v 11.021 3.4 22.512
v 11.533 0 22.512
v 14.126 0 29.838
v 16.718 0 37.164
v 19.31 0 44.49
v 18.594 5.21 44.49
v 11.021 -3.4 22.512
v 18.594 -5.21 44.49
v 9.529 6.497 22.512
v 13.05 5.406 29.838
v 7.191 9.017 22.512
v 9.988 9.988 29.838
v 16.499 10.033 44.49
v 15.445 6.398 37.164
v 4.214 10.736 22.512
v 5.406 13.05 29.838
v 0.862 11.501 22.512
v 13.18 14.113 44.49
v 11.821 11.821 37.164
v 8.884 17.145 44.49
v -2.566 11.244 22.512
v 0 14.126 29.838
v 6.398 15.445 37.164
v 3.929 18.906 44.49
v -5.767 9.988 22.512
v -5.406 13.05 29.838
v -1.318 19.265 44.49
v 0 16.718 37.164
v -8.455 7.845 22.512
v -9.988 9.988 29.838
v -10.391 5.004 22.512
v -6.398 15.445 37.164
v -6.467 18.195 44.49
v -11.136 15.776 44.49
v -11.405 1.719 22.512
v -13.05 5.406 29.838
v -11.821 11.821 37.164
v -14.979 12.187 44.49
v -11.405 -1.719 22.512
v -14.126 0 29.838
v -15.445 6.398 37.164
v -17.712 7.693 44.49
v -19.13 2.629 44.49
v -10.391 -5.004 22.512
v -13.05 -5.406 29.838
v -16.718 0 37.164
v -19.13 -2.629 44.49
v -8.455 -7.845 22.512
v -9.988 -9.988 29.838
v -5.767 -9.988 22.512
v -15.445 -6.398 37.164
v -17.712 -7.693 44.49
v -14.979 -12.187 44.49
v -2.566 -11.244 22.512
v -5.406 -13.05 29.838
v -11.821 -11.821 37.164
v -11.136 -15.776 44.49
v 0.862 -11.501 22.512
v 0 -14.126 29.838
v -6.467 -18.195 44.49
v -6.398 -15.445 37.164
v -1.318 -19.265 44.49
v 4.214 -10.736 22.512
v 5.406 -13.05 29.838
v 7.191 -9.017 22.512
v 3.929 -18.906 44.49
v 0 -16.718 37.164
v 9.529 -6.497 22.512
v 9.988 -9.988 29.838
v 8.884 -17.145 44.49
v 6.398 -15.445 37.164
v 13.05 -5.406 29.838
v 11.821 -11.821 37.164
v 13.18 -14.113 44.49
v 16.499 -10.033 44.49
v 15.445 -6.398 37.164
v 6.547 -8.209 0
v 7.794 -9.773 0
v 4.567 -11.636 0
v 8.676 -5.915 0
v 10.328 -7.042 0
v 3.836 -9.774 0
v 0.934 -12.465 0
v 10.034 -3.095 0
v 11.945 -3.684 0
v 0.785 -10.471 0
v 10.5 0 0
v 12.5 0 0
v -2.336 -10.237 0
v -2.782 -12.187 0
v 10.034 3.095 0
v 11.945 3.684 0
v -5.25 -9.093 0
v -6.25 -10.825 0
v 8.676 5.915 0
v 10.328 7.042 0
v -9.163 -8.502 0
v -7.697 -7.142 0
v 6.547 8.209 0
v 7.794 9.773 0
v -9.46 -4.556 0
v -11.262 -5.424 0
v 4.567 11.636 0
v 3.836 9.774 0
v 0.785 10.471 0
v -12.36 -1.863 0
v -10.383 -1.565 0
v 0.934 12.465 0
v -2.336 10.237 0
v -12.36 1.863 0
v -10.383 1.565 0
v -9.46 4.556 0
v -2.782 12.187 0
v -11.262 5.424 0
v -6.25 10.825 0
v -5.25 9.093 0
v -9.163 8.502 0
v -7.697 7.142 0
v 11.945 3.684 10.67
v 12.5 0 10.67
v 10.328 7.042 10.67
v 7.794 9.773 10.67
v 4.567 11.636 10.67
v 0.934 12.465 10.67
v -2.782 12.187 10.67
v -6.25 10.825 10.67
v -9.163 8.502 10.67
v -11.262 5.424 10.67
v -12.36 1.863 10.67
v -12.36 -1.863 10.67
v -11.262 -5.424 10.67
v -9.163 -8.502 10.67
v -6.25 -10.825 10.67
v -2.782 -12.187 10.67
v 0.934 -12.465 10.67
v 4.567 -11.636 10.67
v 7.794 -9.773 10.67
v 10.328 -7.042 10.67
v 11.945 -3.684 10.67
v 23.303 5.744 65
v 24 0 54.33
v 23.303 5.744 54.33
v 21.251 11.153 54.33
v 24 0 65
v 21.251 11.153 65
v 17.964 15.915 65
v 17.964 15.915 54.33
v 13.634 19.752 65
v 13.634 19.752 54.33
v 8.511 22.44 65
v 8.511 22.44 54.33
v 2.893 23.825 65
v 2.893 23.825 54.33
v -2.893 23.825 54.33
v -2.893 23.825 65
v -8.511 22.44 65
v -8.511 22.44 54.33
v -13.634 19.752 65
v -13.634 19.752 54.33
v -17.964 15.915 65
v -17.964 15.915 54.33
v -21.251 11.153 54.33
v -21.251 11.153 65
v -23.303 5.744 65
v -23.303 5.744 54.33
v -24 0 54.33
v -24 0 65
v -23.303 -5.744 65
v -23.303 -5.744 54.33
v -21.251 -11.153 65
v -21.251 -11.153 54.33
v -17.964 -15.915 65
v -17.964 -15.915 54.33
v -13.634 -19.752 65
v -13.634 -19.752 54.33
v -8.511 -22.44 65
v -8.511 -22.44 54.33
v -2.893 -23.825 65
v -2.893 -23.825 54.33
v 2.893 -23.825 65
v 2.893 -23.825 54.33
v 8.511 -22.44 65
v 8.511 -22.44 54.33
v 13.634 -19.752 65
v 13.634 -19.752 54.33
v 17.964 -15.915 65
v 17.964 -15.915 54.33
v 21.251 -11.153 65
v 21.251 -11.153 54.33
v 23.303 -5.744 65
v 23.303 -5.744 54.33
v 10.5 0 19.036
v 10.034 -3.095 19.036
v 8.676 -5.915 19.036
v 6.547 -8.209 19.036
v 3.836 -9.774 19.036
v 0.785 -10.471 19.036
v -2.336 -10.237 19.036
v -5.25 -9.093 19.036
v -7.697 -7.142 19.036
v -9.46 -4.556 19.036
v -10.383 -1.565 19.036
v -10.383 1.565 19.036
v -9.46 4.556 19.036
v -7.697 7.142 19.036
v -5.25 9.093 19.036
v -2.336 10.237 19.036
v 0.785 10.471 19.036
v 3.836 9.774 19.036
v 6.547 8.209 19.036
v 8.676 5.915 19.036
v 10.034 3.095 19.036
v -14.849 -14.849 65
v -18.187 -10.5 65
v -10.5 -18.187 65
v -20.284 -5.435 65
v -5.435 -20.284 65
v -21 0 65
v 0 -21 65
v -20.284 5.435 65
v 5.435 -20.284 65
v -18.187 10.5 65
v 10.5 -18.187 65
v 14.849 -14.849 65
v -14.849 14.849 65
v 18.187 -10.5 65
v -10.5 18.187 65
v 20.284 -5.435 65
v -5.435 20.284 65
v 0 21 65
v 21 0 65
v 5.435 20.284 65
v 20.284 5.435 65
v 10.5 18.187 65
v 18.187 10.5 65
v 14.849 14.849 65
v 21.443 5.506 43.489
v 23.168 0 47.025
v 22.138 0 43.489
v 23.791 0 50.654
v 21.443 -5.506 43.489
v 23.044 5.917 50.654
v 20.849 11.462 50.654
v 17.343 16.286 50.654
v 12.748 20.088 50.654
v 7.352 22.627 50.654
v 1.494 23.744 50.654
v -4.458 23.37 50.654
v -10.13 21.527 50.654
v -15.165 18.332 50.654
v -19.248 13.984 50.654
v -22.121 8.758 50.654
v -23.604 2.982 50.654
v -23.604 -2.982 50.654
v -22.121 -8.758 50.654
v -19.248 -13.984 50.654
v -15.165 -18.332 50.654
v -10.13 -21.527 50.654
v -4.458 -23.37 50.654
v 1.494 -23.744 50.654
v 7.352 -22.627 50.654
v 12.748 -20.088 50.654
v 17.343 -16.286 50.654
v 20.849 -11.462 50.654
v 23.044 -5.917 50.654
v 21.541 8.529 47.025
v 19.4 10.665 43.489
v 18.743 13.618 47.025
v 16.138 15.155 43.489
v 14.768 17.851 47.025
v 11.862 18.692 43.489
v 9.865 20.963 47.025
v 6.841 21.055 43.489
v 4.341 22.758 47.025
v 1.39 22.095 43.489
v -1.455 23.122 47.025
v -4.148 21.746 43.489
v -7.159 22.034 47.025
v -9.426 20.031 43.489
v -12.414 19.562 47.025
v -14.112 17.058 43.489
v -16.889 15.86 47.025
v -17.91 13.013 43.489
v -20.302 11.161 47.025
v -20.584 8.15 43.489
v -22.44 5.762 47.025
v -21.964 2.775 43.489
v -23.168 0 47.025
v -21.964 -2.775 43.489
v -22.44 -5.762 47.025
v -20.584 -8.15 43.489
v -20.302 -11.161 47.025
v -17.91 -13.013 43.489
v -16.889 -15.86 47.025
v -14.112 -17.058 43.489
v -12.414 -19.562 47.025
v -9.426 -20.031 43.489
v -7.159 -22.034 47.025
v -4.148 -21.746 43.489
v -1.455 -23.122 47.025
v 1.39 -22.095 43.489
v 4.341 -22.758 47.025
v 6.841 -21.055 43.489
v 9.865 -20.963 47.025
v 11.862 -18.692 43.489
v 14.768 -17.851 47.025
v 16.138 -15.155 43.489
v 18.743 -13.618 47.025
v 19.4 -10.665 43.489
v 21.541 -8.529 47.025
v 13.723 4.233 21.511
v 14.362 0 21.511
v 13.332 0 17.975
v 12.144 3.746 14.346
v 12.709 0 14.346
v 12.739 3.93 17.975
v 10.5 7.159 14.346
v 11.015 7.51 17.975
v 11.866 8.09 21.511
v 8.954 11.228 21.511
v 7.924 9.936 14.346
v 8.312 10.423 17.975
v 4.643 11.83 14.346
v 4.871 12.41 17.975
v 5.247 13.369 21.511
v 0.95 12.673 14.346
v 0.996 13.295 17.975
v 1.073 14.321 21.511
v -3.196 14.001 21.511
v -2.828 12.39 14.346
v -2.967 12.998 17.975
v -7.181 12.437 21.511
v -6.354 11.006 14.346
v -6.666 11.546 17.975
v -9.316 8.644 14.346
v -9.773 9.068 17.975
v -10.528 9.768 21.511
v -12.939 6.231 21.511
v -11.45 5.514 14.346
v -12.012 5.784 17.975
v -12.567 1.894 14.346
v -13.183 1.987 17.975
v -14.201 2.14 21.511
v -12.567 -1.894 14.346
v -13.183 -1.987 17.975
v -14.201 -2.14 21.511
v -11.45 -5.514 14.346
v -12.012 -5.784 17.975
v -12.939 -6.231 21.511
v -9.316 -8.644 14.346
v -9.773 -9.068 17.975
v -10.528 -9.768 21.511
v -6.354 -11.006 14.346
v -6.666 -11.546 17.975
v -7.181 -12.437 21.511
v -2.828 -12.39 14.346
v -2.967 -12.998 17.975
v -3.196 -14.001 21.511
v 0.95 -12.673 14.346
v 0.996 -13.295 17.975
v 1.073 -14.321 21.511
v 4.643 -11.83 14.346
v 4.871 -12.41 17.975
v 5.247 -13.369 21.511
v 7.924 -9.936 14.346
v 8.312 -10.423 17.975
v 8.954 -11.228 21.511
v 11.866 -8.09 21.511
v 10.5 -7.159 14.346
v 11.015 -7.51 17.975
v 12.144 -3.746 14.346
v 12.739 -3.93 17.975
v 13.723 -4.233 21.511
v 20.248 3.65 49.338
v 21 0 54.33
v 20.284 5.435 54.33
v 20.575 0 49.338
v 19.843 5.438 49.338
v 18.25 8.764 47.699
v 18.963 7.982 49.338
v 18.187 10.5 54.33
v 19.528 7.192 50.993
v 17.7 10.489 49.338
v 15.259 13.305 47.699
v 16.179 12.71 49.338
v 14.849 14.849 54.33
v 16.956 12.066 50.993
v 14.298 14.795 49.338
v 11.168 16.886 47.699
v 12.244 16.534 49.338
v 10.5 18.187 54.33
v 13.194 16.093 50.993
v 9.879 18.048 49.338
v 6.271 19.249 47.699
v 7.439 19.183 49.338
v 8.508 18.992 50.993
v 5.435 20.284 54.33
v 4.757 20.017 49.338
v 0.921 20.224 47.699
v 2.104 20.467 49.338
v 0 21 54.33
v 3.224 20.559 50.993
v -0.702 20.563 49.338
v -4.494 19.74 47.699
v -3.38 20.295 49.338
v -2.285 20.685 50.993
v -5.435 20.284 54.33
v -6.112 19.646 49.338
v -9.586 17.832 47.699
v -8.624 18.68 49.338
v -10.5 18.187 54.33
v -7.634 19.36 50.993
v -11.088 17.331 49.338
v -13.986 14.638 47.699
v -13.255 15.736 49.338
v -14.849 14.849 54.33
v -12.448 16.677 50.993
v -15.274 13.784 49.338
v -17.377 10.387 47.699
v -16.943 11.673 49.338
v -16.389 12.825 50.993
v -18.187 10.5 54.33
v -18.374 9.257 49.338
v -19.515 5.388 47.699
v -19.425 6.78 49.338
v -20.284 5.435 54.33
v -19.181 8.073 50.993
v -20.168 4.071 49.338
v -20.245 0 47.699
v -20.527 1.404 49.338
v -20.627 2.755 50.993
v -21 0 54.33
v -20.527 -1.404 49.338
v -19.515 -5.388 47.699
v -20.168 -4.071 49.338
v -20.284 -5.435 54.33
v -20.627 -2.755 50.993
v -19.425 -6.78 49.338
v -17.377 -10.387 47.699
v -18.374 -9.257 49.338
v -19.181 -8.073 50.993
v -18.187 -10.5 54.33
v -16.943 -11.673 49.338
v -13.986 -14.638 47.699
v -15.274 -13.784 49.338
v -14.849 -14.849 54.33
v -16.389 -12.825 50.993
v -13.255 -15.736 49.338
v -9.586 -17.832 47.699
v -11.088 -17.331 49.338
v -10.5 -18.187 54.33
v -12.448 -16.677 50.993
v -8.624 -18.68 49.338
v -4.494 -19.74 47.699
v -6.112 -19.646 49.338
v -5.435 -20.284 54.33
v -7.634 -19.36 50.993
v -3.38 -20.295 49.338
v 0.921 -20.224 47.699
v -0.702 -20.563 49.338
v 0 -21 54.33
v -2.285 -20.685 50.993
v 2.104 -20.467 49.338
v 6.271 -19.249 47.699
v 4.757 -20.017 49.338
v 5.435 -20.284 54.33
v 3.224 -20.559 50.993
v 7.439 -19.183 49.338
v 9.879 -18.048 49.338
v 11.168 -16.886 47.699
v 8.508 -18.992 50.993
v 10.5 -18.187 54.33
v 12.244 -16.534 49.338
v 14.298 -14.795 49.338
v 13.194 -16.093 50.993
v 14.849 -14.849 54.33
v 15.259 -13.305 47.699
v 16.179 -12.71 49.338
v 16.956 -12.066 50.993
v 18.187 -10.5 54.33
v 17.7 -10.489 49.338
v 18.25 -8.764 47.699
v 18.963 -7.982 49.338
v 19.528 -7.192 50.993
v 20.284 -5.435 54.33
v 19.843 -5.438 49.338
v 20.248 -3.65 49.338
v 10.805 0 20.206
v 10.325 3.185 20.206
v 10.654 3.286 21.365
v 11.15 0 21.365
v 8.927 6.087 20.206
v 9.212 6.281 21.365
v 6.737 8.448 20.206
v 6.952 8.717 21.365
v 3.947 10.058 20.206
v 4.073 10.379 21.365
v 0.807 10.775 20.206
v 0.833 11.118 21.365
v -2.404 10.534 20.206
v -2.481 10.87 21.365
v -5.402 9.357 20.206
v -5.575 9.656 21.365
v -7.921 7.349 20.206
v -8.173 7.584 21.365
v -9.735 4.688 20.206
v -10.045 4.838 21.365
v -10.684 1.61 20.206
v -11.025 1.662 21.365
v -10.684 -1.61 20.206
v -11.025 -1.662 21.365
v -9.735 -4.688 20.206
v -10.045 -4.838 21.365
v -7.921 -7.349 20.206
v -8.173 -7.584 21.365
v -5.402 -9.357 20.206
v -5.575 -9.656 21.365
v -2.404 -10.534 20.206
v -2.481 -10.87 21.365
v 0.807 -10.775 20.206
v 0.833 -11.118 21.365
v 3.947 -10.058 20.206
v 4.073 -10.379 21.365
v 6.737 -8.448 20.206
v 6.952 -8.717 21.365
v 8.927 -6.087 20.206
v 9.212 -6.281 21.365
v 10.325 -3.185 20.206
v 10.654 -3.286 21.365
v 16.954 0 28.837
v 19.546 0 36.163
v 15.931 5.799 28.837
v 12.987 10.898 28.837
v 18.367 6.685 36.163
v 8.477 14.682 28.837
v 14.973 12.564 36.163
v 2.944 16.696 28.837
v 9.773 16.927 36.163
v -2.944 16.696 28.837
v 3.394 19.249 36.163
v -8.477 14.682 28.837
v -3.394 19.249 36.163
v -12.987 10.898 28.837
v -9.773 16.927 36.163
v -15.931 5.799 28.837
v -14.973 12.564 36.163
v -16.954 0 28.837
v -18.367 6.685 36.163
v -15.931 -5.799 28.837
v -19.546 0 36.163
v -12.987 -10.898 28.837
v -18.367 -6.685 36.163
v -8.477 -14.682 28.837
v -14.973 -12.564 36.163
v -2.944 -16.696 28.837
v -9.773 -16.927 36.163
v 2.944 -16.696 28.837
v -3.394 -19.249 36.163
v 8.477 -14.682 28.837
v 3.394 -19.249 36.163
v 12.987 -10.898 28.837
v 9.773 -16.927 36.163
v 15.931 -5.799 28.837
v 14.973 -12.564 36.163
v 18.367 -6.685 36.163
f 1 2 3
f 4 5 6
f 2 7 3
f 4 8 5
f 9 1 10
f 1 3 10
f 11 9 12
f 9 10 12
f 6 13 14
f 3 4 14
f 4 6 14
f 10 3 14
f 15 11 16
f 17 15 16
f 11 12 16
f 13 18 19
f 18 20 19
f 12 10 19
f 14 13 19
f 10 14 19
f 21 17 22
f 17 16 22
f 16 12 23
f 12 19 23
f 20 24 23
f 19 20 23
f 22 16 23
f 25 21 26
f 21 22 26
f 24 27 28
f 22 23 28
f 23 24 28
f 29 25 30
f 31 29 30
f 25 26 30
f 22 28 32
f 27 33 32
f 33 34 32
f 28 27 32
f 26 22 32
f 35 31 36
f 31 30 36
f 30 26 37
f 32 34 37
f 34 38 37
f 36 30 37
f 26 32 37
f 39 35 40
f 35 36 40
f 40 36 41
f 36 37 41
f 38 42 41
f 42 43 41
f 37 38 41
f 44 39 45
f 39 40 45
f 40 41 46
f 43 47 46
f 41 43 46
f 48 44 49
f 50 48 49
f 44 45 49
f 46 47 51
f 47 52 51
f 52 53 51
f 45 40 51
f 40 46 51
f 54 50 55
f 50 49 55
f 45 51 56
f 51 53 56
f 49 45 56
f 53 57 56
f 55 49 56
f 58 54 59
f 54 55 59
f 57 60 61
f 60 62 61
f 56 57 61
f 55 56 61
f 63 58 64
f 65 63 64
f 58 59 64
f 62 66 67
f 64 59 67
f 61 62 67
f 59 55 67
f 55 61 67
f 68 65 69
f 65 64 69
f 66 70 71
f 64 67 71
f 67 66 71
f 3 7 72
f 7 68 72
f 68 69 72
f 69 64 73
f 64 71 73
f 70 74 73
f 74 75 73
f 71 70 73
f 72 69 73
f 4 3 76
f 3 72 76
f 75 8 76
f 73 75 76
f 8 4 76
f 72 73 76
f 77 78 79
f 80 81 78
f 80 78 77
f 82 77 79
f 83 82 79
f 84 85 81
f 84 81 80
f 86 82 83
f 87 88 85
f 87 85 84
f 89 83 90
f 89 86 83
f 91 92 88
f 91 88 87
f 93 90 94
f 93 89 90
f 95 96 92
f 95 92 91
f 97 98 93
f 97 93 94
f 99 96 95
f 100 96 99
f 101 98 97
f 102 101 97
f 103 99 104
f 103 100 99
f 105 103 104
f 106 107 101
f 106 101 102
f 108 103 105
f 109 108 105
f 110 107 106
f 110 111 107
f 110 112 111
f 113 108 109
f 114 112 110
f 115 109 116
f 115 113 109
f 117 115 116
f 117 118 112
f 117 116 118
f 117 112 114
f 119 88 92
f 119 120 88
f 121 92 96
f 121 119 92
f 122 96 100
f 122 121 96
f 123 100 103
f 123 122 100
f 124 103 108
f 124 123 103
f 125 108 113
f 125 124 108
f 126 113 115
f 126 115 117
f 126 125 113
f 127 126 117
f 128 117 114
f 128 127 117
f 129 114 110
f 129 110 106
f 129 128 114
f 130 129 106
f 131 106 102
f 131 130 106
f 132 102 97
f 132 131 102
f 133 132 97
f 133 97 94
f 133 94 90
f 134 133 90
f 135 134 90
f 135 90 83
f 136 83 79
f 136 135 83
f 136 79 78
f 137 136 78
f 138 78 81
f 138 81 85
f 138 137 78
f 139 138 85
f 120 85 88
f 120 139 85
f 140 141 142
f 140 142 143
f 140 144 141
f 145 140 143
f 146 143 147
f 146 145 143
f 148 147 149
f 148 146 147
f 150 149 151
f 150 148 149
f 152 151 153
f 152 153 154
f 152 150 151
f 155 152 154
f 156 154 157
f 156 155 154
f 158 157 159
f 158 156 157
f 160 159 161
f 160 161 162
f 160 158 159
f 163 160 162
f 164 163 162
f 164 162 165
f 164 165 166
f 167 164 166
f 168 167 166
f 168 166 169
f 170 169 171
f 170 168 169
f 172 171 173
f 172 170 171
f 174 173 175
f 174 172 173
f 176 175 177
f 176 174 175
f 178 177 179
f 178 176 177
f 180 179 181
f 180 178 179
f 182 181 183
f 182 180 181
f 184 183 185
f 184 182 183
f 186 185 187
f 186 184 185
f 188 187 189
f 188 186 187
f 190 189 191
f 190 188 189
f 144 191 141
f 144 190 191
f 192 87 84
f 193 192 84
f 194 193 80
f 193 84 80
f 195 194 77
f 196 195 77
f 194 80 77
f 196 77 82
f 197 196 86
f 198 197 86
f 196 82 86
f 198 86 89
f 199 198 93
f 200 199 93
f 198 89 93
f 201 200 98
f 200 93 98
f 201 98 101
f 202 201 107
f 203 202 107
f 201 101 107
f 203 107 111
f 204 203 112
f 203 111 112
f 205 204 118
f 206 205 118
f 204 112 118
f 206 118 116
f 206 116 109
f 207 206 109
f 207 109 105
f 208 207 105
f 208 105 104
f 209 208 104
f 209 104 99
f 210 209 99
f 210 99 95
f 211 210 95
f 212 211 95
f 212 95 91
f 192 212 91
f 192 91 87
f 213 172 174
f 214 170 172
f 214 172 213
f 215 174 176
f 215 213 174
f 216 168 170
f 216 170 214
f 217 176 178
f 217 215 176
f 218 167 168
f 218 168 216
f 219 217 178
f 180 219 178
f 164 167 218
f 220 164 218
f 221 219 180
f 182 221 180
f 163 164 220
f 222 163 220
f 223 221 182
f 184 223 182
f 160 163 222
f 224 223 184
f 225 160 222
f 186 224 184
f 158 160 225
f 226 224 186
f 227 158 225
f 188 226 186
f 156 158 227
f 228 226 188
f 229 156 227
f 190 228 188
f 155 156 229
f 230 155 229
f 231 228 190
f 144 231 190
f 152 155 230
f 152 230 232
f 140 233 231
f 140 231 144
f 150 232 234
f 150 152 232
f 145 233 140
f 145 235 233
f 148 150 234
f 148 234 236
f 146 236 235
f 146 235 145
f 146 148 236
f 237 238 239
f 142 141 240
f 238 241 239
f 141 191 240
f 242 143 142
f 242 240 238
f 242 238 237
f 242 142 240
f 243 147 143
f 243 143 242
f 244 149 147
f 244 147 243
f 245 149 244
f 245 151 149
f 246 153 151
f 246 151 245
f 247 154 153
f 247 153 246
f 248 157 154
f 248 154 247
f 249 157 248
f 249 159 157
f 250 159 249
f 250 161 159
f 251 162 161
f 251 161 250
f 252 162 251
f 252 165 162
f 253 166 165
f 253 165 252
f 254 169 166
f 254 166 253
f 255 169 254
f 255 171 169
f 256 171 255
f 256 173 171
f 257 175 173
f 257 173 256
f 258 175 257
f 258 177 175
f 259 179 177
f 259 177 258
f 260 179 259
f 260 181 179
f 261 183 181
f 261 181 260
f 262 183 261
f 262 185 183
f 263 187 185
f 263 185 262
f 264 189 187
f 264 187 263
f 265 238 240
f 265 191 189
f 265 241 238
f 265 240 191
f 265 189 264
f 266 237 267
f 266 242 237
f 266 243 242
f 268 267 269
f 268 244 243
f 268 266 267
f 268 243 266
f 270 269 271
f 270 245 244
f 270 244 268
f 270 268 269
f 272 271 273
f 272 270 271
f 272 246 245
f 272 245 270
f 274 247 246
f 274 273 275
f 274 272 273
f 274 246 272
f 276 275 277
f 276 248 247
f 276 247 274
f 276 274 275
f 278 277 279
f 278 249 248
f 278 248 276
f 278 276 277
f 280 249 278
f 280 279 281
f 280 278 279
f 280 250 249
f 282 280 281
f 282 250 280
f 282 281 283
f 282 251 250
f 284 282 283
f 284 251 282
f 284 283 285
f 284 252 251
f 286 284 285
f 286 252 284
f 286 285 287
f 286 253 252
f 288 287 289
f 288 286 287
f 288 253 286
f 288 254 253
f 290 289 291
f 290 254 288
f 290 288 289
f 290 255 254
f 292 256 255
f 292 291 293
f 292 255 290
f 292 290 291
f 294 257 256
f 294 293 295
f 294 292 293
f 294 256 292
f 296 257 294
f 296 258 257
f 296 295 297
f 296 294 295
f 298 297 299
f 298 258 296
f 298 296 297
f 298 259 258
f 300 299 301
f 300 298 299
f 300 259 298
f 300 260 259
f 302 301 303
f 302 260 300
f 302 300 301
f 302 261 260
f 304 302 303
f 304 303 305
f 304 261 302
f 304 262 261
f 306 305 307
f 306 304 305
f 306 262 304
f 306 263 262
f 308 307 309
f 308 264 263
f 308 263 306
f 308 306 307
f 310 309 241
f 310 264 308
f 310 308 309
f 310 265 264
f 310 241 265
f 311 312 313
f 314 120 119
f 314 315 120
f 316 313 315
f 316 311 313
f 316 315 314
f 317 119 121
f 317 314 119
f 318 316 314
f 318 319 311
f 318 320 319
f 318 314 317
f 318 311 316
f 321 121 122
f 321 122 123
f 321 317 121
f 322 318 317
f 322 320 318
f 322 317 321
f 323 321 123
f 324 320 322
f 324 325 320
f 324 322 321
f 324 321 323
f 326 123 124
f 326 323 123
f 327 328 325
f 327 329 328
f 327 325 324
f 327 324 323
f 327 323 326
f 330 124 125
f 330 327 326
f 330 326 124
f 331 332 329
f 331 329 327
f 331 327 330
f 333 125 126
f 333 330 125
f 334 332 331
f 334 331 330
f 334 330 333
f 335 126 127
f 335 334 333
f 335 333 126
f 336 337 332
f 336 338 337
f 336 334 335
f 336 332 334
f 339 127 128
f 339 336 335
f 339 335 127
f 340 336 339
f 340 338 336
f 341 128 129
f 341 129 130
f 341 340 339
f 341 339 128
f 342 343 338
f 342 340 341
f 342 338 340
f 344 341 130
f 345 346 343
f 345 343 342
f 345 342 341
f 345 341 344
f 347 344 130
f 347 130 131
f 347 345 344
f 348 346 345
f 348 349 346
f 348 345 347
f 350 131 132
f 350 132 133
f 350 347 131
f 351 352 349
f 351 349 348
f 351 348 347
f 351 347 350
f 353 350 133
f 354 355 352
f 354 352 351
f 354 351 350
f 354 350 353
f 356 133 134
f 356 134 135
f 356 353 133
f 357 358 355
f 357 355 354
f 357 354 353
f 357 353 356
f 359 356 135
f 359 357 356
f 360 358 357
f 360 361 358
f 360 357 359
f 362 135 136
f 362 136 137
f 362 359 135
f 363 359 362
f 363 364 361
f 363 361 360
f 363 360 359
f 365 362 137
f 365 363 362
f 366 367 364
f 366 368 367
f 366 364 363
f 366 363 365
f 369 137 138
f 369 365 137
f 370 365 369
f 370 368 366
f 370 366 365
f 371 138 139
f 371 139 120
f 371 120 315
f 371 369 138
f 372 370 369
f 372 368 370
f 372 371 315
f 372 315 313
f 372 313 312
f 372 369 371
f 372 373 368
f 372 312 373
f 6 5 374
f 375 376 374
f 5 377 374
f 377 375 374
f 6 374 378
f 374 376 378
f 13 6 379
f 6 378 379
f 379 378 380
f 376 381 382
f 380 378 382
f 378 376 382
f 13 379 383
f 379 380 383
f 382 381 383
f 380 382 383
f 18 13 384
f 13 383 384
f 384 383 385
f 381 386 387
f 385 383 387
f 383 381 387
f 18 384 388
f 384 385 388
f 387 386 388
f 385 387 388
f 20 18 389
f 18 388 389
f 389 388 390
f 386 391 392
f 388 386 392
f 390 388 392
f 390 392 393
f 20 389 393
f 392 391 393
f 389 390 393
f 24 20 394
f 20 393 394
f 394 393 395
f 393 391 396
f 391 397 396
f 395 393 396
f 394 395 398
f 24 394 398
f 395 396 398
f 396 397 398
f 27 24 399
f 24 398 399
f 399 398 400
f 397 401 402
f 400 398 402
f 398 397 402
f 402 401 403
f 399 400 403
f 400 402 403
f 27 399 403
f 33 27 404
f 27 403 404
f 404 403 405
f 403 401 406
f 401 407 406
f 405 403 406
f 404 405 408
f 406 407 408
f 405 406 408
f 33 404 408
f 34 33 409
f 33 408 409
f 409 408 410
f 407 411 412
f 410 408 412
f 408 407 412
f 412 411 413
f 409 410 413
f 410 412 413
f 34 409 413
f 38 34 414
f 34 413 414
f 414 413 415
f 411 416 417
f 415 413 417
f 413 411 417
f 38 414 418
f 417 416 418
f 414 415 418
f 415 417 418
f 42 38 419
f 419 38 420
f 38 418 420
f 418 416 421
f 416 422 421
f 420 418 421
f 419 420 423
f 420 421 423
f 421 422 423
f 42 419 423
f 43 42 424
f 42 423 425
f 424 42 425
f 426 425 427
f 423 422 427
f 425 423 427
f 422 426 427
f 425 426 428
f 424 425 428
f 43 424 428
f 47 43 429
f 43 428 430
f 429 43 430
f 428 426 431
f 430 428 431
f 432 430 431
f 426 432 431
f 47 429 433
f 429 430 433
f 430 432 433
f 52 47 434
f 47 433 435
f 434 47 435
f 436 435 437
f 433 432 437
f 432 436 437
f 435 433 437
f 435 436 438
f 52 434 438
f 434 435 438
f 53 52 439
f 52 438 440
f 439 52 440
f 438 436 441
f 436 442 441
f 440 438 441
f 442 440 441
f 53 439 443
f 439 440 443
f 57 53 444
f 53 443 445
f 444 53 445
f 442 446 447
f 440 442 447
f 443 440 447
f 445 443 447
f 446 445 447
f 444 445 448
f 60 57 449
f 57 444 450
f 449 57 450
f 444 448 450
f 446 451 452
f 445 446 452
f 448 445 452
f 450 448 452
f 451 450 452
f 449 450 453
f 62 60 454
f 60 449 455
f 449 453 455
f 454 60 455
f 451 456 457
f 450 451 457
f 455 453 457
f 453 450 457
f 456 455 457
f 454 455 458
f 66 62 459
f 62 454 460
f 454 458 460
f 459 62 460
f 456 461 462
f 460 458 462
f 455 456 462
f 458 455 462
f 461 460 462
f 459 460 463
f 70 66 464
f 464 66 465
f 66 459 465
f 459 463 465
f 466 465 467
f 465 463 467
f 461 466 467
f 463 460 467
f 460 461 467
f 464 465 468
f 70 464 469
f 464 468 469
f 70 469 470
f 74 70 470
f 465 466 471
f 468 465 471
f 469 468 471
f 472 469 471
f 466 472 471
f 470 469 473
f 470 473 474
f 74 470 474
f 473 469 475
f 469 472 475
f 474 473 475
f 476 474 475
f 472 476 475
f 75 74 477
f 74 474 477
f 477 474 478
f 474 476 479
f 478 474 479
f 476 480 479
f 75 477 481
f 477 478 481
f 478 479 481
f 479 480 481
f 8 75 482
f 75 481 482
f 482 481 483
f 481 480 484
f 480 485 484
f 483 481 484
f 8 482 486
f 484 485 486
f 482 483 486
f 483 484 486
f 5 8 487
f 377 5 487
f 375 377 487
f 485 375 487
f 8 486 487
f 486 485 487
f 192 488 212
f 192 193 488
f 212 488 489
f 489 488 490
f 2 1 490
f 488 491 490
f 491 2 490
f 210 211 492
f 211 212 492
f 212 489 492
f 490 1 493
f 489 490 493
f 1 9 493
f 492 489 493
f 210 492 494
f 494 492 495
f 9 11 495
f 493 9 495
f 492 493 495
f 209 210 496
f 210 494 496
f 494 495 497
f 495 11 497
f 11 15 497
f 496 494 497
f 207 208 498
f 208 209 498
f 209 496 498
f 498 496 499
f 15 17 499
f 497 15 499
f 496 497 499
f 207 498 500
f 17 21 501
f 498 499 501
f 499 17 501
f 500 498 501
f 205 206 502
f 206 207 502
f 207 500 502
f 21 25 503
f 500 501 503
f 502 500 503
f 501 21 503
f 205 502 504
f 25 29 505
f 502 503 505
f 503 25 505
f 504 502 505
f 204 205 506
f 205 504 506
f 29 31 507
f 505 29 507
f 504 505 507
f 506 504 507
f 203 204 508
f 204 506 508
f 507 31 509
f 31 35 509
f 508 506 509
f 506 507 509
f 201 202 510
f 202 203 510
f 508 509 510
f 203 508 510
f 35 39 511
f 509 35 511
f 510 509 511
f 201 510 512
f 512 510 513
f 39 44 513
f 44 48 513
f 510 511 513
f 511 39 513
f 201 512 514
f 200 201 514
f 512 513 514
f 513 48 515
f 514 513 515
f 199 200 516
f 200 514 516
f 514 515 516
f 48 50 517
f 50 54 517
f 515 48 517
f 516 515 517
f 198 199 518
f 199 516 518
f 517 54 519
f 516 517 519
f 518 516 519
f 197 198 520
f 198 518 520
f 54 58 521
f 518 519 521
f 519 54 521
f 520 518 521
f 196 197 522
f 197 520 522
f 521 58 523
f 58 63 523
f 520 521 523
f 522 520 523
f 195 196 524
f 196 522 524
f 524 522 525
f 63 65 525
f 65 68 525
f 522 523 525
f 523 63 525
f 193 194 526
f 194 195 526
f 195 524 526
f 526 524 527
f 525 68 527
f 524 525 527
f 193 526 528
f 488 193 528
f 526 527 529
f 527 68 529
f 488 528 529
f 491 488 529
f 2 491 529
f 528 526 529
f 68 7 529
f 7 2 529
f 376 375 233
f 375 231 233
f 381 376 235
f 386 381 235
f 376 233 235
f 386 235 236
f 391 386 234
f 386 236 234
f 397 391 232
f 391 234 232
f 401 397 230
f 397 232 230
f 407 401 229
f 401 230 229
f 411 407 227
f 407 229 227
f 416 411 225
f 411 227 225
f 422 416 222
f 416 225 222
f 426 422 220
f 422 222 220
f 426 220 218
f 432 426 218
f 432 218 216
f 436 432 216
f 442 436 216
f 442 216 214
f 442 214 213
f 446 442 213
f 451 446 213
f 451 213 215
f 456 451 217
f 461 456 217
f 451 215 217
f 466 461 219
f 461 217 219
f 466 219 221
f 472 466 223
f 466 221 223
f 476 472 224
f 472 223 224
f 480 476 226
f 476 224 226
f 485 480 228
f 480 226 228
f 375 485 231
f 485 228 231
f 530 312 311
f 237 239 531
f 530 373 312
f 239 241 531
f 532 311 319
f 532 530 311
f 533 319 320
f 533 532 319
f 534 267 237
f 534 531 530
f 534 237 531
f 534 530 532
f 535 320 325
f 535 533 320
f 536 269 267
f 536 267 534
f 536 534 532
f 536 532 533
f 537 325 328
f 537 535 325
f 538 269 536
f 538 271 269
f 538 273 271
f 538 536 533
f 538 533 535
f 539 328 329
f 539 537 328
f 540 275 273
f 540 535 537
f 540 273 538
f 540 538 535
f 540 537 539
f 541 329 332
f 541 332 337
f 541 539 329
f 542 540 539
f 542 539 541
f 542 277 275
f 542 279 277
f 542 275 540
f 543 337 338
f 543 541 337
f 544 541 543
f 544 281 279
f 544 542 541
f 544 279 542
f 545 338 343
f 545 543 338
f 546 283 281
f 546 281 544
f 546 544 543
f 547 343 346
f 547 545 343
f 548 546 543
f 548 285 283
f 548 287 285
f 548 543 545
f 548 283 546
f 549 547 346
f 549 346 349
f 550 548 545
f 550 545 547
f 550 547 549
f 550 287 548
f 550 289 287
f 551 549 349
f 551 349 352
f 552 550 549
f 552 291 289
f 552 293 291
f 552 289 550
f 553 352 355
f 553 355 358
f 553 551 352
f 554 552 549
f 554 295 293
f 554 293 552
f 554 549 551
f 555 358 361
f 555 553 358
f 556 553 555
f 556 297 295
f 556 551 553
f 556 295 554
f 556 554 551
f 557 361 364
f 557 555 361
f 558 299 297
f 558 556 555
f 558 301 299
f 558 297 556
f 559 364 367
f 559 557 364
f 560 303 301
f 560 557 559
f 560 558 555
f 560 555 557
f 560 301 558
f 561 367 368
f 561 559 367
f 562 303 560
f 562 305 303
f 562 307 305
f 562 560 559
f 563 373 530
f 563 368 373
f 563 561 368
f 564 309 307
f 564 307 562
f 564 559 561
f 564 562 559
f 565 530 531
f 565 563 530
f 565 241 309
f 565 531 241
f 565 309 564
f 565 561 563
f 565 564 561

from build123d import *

# Parameters (mm, degrees)
F5_T     = -3
F4_R     = 10.5
F6_DEPTH = 65.001


with BuildPart() as f2:
    # F1 (on Front) → F2 (revolve)
    with BuildSketch(Plane.XZ):
        with BuildLine():
            Line((0, 65), (0, 0))
            Line((0, 0), (12.5, 0))
            Line((12.5, 0), (12.5, 10.6695285708))
            ThreePointArc((12.5, 10.6695285708), (12.9687621154, 16.169510351), (14.3615261282, 21.51083471))
            Line((14.3615261282, 21.51083471), (22.1384738718, 43.48916529))
            ThreePointArc((22.1384738718, 43.48916529), (23.5312378846, 48.830489649), (24, 54.3304714292))
            Line((24, 54.3304714292), (24, 65))
            Line((24, 65), (0, 65))
        make_face()
    revolve(axis=Axis((0, 0, 32.5), (0, 0, 1)))

    # F5
    f5_openings = [f2.faces().sort_by_distance(p)[0] for p in [
        (0, 0, 65),
    ]]
    offset(amount=F5_T, openings=f5_openings)

    # F4 (on face) → F6 (cut, through all)
    with BuildSketch(Plane(origin=(0, 0, 0), x_dir=(1, 0, 0), z_dir=(0, 0, -1))):
        Circle(F4_R)
    extrude(amount=-F6_DEPTH, mode=Mode.SUBTRACT)


solid = f2.part
